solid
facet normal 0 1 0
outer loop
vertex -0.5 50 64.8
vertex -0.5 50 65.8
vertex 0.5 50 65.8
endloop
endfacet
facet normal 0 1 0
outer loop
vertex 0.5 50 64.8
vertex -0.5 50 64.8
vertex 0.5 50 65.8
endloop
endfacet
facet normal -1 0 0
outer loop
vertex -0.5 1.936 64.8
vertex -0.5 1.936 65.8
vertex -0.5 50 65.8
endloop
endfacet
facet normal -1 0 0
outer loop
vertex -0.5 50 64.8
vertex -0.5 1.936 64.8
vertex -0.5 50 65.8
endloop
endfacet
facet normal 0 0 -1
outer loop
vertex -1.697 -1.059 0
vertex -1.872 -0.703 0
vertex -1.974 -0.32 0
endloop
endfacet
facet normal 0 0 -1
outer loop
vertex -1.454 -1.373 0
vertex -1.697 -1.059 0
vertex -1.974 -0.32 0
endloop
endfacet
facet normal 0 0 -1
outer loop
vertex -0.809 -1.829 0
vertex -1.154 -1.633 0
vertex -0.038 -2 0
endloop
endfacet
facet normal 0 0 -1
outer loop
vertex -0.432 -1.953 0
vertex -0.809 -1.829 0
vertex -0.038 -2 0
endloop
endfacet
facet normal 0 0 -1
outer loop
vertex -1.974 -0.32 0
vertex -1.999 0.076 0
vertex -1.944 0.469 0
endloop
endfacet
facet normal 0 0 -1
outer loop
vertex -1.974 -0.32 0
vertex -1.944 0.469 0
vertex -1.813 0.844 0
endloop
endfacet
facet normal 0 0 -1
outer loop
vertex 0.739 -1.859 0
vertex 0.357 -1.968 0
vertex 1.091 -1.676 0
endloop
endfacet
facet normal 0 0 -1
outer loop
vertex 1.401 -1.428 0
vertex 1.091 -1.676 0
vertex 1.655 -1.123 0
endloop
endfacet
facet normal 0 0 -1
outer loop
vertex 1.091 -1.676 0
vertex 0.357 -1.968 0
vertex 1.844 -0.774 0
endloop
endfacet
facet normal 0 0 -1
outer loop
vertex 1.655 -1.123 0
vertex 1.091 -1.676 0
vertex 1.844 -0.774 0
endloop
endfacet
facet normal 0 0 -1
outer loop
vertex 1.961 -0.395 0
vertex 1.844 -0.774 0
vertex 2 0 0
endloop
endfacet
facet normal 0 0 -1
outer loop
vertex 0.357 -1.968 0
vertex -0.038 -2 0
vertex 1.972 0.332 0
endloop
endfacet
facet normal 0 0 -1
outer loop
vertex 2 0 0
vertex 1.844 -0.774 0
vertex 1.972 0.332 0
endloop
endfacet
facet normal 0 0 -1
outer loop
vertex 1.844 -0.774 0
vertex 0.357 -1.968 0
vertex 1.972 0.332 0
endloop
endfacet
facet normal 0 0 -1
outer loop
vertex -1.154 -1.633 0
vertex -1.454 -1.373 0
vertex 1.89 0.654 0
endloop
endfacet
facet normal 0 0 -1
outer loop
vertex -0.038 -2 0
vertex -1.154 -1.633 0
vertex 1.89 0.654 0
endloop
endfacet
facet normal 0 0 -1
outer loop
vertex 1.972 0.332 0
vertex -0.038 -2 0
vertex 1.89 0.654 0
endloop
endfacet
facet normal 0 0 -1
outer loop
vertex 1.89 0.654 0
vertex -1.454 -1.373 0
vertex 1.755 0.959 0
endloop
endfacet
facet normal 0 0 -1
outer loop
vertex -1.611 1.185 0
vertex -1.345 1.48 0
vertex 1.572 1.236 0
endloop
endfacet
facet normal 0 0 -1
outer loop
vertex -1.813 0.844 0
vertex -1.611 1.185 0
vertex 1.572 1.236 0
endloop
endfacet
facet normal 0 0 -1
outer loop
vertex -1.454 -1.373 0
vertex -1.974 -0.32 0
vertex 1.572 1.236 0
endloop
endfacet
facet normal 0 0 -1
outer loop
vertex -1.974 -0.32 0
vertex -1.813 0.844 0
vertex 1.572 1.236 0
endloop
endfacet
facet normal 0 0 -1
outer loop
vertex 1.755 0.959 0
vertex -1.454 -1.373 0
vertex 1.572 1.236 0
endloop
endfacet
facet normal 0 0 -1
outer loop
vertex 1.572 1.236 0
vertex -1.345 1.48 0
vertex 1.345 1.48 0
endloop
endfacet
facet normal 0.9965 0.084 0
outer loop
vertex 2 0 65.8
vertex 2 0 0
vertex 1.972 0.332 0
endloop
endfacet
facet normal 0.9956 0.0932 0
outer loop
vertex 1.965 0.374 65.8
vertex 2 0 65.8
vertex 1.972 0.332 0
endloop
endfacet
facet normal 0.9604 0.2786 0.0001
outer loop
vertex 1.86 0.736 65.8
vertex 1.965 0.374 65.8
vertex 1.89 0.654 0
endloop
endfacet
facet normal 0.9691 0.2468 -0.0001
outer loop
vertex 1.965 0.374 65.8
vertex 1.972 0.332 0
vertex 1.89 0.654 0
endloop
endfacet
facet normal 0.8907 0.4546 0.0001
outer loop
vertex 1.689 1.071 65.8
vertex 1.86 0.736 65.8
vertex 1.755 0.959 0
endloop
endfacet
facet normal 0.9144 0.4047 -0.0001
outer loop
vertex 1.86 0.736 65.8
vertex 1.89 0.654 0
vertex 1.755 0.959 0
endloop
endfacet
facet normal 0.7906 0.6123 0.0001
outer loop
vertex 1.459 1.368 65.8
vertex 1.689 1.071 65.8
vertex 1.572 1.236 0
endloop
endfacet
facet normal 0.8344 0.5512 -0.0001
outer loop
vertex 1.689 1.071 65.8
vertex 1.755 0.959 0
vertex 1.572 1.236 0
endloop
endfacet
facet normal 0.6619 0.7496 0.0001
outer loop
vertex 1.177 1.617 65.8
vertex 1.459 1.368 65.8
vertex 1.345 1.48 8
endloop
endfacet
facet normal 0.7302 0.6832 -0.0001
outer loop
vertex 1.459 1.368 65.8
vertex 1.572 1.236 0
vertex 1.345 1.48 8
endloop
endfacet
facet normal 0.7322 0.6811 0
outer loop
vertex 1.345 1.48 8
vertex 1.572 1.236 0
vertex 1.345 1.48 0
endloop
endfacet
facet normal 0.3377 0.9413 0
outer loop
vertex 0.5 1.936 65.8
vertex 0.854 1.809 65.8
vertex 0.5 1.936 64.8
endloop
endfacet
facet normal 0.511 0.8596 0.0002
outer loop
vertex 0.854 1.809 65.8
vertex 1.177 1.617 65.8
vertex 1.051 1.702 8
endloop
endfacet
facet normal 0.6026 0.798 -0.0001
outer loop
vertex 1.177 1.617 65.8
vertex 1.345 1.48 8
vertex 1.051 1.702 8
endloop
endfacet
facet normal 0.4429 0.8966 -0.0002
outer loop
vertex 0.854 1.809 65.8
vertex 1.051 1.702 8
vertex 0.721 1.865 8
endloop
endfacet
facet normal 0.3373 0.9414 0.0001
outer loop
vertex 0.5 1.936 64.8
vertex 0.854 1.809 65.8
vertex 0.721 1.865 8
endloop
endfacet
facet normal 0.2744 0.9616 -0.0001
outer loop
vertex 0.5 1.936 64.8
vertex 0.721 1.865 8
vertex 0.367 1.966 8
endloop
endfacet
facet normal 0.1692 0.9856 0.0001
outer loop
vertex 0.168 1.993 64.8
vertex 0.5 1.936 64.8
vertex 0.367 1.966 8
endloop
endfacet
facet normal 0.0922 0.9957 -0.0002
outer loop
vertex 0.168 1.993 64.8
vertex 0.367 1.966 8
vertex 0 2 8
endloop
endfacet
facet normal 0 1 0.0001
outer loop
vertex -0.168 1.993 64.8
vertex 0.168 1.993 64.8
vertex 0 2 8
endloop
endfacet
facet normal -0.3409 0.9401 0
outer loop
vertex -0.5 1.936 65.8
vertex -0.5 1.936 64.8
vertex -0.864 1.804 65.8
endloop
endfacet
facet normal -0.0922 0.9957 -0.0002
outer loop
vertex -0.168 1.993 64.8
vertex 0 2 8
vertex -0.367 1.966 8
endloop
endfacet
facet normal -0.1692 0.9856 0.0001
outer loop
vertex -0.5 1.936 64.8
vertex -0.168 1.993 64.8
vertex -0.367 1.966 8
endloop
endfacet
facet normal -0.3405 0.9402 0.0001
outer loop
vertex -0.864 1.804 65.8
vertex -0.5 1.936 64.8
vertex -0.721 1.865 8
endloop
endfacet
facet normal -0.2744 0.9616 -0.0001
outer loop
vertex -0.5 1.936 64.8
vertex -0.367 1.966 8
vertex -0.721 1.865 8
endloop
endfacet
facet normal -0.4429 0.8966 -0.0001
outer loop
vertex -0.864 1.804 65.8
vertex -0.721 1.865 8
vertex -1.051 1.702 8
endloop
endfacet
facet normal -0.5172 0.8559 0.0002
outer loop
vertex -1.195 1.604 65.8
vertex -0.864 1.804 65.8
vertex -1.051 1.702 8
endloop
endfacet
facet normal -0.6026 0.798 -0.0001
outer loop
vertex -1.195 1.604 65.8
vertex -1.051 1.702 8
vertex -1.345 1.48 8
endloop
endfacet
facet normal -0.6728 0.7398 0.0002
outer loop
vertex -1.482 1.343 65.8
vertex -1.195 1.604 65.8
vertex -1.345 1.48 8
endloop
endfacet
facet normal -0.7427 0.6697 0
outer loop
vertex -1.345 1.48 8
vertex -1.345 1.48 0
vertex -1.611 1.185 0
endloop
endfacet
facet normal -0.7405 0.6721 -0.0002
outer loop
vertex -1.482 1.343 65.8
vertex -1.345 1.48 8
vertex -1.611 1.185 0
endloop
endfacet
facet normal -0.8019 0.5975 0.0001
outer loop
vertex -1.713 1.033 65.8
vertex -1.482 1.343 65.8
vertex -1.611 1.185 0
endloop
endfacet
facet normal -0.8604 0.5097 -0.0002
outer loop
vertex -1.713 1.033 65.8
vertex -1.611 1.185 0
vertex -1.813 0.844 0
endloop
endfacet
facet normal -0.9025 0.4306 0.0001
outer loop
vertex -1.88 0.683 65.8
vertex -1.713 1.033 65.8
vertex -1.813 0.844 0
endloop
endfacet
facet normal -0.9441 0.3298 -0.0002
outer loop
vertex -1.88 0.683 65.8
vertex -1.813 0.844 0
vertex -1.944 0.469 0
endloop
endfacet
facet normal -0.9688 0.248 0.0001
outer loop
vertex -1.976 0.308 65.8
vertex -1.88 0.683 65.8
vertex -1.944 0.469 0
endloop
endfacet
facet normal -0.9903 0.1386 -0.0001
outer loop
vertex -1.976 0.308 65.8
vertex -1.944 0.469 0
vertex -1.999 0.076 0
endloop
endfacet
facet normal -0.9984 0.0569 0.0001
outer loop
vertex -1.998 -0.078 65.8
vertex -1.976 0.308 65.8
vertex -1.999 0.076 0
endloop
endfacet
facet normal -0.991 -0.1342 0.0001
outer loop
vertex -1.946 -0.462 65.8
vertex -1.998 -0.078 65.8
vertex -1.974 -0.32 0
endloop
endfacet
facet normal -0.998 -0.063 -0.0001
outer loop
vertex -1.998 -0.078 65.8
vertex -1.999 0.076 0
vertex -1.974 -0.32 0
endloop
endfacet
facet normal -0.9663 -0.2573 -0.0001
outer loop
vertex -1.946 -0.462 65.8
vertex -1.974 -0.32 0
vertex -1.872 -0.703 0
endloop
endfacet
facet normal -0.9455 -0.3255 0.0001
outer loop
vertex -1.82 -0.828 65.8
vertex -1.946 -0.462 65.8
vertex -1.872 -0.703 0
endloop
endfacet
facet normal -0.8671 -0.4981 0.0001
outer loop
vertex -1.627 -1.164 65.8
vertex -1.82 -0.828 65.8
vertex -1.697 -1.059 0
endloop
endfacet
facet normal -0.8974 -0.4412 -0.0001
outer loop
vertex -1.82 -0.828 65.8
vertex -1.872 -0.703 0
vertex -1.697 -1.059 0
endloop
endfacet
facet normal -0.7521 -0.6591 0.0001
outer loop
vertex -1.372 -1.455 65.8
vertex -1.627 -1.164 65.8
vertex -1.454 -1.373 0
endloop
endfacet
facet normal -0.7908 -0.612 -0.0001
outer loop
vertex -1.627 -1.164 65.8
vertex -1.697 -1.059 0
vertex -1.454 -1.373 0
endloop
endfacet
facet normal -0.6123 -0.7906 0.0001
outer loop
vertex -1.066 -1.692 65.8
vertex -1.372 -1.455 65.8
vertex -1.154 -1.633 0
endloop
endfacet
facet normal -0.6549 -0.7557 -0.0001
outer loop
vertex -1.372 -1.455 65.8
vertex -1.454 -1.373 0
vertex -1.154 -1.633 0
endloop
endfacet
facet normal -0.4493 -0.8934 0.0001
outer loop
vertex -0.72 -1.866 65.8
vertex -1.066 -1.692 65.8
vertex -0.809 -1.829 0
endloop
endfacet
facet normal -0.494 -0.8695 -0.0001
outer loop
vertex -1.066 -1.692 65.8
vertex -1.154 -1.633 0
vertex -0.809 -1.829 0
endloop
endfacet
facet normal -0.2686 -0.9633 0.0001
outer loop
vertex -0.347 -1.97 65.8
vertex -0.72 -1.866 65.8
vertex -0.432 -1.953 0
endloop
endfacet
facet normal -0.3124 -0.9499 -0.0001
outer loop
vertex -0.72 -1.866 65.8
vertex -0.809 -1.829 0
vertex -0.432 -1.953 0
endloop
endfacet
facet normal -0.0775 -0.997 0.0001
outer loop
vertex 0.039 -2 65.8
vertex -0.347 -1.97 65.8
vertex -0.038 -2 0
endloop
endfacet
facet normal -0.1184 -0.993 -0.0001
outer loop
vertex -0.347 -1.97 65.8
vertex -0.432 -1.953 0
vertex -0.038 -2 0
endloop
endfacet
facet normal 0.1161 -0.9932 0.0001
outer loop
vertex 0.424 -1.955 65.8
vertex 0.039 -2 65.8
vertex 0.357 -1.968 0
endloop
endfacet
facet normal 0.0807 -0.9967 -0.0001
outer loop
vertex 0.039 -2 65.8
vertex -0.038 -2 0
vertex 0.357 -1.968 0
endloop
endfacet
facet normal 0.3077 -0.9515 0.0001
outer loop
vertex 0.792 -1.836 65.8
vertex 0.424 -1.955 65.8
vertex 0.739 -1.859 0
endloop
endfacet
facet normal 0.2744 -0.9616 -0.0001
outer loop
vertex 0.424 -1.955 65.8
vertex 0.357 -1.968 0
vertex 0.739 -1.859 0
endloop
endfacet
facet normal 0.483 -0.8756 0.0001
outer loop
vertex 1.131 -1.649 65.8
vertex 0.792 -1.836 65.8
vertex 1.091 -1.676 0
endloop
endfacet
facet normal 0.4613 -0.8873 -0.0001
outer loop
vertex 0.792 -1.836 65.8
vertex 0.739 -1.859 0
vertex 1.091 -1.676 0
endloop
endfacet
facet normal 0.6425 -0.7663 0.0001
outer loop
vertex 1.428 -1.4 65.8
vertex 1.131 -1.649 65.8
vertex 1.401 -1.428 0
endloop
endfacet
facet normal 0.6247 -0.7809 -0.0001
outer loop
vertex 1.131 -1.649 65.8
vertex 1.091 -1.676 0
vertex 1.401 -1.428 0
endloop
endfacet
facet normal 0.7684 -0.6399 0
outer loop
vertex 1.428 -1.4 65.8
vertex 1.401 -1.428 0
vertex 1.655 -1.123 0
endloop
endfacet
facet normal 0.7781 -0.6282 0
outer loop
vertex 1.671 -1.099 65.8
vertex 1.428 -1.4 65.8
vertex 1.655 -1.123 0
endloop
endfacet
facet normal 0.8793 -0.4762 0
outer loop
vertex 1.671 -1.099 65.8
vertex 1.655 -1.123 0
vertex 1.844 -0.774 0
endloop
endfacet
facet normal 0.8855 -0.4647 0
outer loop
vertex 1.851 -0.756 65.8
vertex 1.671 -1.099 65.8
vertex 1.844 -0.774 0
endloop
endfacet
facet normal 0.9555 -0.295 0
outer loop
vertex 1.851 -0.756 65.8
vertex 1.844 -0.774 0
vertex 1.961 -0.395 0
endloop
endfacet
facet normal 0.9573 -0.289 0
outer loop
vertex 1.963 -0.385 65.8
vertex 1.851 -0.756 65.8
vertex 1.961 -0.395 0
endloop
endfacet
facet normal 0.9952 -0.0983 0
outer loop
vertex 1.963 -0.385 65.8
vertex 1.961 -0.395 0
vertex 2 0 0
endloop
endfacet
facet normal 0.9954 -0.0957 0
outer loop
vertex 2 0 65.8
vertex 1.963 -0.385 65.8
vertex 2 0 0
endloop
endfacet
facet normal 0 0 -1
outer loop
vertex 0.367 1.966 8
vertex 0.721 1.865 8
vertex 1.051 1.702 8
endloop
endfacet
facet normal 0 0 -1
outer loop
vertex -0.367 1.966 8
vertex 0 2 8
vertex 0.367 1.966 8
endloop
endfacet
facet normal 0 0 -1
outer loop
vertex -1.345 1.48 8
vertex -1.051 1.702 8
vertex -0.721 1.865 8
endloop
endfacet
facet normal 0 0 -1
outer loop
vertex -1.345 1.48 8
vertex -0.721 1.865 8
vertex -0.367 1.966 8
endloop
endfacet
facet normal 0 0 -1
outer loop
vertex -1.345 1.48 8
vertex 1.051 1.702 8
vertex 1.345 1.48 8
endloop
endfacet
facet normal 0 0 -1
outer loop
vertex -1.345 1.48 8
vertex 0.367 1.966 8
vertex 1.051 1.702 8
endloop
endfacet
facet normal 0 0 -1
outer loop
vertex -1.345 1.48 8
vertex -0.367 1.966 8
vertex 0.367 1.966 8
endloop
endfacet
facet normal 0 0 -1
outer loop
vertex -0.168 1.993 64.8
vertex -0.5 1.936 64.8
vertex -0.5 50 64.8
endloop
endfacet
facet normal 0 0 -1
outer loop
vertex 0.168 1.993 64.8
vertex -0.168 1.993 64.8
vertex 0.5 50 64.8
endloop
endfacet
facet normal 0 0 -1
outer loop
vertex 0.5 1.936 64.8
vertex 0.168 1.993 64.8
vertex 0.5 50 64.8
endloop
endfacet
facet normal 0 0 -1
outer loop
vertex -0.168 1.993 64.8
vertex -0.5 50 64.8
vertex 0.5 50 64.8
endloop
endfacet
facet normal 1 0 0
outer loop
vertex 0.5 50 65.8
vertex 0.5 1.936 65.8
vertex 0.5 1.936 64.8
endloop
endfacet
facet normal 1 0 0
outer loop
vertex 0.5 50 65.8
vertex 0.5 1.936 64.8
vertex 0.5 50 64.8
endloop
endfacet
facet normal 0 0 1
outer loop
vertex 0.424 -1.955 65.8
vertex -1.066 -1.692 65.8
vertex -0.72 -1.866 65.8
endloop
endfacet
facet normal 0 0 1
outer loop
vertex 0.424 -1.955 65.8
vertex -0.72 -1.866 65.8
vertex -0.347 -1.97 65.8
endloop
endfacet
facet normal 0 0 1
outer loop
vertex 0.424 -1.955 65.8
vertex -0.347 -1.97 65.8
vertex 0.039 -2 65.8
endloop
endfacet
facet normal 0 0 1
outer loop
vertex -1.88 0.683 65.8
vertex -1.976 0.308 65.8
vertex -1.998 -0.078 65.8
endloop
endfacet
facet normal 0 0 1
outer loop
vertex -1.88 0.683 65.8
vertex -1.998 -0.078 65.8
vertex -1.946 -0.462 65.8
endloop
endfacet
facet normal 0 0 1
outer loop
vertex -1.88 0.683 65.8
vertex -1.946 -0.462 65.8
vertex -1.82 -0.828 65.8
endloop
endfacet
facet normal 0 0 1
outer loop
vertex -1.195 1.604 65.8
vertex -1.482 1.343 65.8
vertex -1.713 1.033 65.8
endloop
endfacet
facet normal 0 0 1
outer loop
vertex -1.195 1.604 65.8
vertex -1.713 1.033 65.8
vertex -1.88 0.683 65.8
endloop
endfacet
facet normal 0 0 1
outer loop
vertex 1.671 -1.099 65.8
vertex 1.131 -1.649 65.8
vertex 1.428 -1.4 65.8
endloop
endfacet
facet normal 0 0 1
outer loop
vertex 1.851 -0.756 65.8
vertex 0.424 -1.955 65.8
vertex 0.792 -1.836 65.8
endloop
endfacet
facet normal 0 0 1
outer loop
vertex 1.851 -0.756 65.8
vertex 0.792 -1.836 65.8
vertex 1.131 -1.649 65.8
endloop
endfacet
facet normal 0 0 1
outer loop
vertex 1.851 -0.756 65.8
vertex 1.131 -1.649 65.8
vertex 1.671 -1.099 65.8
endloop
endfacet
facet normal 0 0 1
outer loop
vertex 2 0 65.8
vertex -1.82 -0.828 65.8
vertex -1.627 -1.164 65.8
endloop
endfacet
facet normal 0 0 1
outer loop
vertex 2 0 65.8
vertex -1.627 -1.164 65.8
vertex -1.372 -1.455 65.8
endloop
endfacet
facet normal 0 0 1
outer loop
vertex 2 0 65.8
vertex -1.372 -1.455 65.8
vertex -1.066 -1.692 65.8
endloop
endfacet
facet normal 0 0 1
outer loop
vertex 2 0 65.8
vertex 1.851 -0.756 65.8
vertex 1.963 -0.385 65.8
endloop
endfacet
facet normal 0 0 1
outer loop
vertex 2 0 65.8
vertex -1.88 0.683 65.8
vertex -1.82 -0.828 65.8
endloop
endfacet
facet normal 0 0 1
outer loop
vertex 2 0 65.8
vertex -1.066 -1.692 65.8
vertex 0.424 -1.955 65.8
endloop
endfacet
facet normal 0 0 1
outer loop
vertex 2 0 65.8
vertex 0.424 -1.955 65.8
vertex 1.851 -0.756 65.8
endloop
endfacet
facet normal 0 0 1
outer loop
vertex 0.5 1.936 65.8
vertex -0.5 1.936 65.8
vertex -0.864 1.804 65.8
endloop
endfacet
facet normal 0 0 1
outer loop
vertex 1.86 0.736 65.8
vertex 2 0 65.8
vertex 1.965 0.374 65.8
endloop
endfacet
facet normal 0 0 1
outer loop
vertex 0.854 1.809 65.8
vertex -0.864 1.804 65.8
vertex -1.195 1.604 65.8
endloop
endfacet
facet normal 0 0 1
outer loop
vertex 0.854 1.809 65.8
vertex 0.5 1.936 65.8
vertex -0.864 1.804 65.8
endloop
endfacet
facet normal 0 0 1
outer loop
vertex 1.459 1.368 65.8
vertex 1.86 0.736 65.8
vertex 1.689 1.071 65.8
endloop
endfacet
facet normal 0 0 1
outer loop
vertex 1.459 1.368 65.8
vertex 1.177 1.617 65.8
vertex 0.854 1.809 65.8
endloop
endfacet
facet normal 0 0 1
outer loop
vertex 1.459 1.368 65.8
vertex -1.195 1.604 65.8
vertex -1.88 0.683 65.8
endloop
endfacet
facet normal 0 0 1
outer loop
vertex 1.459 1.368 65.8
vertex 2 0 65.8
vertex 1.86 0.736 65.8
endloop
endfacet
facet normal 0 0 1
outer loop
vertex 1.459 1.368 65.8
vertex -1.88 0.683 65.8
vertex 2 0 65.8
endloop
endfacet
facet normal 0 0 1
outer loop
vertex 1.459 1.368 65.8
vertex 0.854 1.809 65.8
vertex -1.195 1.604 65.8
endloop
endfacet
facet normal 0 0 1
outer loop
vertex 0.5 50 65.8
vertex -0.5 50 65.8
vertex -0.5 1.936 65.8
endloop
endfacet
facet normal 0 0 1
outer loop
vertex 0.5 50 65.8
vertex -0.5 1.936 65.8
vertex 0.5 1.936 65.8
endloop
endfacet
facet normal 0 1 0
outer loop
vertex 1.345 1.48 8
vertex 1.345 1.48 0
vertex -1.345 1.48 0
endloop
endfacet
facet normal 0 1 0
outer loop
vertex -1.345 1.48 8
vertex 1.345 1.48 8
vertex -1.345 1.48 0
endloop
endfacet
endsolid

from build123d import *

# Parameters (mm, degrees)
SKETCH1_R           = 2
BOSS_EXTRUDE1_DEPTH = 65.8
CUT_EXTRUDE1_DEPTH  = 8
SKETCH3_W           = 1
SKETCH3_H           = 50
BOSS_EXTRUDE2_DEPTH = 1


with BuildPart() as part:
    # Sketch1 → Boss-Extrude1 (new body)
    with BuildSketch(Plane.XY):
        Circle(SKETCH1_R)
    extrude(amount=BOSS_EXTRUDE1_DEPTH)

    # Sketch2 → Cut-Extrude1 (cut)
    with BuildSketch(Plane(origin=(0, 0, 0), x_dir=(-1, 0, 0), z_dir=(0, 0, -1))):
        with BuildLine():
            Line((-1.345213738, 1.48), (1.345213738, 1.48))
            ThreePointArc((1.345213738, 1.48), (0, 2), (-1.345213738, 1.48))
        make_face()
    extrude(amount=-CUT_EXTRUDE1_DEPTH, mode=Mode.SUBTRACT)

    # Sketch3 → Boss-Extrude2 (add)
    with BuildSketch(Plane.XY.offset(65.8)):
        with Locations((0, 25)):
            Rectangle(SKETCH3_W, SKETCH3_H)
    extrude(amount=-BOSS_EXTRUDE2_DEPTH)


solid = part.part
